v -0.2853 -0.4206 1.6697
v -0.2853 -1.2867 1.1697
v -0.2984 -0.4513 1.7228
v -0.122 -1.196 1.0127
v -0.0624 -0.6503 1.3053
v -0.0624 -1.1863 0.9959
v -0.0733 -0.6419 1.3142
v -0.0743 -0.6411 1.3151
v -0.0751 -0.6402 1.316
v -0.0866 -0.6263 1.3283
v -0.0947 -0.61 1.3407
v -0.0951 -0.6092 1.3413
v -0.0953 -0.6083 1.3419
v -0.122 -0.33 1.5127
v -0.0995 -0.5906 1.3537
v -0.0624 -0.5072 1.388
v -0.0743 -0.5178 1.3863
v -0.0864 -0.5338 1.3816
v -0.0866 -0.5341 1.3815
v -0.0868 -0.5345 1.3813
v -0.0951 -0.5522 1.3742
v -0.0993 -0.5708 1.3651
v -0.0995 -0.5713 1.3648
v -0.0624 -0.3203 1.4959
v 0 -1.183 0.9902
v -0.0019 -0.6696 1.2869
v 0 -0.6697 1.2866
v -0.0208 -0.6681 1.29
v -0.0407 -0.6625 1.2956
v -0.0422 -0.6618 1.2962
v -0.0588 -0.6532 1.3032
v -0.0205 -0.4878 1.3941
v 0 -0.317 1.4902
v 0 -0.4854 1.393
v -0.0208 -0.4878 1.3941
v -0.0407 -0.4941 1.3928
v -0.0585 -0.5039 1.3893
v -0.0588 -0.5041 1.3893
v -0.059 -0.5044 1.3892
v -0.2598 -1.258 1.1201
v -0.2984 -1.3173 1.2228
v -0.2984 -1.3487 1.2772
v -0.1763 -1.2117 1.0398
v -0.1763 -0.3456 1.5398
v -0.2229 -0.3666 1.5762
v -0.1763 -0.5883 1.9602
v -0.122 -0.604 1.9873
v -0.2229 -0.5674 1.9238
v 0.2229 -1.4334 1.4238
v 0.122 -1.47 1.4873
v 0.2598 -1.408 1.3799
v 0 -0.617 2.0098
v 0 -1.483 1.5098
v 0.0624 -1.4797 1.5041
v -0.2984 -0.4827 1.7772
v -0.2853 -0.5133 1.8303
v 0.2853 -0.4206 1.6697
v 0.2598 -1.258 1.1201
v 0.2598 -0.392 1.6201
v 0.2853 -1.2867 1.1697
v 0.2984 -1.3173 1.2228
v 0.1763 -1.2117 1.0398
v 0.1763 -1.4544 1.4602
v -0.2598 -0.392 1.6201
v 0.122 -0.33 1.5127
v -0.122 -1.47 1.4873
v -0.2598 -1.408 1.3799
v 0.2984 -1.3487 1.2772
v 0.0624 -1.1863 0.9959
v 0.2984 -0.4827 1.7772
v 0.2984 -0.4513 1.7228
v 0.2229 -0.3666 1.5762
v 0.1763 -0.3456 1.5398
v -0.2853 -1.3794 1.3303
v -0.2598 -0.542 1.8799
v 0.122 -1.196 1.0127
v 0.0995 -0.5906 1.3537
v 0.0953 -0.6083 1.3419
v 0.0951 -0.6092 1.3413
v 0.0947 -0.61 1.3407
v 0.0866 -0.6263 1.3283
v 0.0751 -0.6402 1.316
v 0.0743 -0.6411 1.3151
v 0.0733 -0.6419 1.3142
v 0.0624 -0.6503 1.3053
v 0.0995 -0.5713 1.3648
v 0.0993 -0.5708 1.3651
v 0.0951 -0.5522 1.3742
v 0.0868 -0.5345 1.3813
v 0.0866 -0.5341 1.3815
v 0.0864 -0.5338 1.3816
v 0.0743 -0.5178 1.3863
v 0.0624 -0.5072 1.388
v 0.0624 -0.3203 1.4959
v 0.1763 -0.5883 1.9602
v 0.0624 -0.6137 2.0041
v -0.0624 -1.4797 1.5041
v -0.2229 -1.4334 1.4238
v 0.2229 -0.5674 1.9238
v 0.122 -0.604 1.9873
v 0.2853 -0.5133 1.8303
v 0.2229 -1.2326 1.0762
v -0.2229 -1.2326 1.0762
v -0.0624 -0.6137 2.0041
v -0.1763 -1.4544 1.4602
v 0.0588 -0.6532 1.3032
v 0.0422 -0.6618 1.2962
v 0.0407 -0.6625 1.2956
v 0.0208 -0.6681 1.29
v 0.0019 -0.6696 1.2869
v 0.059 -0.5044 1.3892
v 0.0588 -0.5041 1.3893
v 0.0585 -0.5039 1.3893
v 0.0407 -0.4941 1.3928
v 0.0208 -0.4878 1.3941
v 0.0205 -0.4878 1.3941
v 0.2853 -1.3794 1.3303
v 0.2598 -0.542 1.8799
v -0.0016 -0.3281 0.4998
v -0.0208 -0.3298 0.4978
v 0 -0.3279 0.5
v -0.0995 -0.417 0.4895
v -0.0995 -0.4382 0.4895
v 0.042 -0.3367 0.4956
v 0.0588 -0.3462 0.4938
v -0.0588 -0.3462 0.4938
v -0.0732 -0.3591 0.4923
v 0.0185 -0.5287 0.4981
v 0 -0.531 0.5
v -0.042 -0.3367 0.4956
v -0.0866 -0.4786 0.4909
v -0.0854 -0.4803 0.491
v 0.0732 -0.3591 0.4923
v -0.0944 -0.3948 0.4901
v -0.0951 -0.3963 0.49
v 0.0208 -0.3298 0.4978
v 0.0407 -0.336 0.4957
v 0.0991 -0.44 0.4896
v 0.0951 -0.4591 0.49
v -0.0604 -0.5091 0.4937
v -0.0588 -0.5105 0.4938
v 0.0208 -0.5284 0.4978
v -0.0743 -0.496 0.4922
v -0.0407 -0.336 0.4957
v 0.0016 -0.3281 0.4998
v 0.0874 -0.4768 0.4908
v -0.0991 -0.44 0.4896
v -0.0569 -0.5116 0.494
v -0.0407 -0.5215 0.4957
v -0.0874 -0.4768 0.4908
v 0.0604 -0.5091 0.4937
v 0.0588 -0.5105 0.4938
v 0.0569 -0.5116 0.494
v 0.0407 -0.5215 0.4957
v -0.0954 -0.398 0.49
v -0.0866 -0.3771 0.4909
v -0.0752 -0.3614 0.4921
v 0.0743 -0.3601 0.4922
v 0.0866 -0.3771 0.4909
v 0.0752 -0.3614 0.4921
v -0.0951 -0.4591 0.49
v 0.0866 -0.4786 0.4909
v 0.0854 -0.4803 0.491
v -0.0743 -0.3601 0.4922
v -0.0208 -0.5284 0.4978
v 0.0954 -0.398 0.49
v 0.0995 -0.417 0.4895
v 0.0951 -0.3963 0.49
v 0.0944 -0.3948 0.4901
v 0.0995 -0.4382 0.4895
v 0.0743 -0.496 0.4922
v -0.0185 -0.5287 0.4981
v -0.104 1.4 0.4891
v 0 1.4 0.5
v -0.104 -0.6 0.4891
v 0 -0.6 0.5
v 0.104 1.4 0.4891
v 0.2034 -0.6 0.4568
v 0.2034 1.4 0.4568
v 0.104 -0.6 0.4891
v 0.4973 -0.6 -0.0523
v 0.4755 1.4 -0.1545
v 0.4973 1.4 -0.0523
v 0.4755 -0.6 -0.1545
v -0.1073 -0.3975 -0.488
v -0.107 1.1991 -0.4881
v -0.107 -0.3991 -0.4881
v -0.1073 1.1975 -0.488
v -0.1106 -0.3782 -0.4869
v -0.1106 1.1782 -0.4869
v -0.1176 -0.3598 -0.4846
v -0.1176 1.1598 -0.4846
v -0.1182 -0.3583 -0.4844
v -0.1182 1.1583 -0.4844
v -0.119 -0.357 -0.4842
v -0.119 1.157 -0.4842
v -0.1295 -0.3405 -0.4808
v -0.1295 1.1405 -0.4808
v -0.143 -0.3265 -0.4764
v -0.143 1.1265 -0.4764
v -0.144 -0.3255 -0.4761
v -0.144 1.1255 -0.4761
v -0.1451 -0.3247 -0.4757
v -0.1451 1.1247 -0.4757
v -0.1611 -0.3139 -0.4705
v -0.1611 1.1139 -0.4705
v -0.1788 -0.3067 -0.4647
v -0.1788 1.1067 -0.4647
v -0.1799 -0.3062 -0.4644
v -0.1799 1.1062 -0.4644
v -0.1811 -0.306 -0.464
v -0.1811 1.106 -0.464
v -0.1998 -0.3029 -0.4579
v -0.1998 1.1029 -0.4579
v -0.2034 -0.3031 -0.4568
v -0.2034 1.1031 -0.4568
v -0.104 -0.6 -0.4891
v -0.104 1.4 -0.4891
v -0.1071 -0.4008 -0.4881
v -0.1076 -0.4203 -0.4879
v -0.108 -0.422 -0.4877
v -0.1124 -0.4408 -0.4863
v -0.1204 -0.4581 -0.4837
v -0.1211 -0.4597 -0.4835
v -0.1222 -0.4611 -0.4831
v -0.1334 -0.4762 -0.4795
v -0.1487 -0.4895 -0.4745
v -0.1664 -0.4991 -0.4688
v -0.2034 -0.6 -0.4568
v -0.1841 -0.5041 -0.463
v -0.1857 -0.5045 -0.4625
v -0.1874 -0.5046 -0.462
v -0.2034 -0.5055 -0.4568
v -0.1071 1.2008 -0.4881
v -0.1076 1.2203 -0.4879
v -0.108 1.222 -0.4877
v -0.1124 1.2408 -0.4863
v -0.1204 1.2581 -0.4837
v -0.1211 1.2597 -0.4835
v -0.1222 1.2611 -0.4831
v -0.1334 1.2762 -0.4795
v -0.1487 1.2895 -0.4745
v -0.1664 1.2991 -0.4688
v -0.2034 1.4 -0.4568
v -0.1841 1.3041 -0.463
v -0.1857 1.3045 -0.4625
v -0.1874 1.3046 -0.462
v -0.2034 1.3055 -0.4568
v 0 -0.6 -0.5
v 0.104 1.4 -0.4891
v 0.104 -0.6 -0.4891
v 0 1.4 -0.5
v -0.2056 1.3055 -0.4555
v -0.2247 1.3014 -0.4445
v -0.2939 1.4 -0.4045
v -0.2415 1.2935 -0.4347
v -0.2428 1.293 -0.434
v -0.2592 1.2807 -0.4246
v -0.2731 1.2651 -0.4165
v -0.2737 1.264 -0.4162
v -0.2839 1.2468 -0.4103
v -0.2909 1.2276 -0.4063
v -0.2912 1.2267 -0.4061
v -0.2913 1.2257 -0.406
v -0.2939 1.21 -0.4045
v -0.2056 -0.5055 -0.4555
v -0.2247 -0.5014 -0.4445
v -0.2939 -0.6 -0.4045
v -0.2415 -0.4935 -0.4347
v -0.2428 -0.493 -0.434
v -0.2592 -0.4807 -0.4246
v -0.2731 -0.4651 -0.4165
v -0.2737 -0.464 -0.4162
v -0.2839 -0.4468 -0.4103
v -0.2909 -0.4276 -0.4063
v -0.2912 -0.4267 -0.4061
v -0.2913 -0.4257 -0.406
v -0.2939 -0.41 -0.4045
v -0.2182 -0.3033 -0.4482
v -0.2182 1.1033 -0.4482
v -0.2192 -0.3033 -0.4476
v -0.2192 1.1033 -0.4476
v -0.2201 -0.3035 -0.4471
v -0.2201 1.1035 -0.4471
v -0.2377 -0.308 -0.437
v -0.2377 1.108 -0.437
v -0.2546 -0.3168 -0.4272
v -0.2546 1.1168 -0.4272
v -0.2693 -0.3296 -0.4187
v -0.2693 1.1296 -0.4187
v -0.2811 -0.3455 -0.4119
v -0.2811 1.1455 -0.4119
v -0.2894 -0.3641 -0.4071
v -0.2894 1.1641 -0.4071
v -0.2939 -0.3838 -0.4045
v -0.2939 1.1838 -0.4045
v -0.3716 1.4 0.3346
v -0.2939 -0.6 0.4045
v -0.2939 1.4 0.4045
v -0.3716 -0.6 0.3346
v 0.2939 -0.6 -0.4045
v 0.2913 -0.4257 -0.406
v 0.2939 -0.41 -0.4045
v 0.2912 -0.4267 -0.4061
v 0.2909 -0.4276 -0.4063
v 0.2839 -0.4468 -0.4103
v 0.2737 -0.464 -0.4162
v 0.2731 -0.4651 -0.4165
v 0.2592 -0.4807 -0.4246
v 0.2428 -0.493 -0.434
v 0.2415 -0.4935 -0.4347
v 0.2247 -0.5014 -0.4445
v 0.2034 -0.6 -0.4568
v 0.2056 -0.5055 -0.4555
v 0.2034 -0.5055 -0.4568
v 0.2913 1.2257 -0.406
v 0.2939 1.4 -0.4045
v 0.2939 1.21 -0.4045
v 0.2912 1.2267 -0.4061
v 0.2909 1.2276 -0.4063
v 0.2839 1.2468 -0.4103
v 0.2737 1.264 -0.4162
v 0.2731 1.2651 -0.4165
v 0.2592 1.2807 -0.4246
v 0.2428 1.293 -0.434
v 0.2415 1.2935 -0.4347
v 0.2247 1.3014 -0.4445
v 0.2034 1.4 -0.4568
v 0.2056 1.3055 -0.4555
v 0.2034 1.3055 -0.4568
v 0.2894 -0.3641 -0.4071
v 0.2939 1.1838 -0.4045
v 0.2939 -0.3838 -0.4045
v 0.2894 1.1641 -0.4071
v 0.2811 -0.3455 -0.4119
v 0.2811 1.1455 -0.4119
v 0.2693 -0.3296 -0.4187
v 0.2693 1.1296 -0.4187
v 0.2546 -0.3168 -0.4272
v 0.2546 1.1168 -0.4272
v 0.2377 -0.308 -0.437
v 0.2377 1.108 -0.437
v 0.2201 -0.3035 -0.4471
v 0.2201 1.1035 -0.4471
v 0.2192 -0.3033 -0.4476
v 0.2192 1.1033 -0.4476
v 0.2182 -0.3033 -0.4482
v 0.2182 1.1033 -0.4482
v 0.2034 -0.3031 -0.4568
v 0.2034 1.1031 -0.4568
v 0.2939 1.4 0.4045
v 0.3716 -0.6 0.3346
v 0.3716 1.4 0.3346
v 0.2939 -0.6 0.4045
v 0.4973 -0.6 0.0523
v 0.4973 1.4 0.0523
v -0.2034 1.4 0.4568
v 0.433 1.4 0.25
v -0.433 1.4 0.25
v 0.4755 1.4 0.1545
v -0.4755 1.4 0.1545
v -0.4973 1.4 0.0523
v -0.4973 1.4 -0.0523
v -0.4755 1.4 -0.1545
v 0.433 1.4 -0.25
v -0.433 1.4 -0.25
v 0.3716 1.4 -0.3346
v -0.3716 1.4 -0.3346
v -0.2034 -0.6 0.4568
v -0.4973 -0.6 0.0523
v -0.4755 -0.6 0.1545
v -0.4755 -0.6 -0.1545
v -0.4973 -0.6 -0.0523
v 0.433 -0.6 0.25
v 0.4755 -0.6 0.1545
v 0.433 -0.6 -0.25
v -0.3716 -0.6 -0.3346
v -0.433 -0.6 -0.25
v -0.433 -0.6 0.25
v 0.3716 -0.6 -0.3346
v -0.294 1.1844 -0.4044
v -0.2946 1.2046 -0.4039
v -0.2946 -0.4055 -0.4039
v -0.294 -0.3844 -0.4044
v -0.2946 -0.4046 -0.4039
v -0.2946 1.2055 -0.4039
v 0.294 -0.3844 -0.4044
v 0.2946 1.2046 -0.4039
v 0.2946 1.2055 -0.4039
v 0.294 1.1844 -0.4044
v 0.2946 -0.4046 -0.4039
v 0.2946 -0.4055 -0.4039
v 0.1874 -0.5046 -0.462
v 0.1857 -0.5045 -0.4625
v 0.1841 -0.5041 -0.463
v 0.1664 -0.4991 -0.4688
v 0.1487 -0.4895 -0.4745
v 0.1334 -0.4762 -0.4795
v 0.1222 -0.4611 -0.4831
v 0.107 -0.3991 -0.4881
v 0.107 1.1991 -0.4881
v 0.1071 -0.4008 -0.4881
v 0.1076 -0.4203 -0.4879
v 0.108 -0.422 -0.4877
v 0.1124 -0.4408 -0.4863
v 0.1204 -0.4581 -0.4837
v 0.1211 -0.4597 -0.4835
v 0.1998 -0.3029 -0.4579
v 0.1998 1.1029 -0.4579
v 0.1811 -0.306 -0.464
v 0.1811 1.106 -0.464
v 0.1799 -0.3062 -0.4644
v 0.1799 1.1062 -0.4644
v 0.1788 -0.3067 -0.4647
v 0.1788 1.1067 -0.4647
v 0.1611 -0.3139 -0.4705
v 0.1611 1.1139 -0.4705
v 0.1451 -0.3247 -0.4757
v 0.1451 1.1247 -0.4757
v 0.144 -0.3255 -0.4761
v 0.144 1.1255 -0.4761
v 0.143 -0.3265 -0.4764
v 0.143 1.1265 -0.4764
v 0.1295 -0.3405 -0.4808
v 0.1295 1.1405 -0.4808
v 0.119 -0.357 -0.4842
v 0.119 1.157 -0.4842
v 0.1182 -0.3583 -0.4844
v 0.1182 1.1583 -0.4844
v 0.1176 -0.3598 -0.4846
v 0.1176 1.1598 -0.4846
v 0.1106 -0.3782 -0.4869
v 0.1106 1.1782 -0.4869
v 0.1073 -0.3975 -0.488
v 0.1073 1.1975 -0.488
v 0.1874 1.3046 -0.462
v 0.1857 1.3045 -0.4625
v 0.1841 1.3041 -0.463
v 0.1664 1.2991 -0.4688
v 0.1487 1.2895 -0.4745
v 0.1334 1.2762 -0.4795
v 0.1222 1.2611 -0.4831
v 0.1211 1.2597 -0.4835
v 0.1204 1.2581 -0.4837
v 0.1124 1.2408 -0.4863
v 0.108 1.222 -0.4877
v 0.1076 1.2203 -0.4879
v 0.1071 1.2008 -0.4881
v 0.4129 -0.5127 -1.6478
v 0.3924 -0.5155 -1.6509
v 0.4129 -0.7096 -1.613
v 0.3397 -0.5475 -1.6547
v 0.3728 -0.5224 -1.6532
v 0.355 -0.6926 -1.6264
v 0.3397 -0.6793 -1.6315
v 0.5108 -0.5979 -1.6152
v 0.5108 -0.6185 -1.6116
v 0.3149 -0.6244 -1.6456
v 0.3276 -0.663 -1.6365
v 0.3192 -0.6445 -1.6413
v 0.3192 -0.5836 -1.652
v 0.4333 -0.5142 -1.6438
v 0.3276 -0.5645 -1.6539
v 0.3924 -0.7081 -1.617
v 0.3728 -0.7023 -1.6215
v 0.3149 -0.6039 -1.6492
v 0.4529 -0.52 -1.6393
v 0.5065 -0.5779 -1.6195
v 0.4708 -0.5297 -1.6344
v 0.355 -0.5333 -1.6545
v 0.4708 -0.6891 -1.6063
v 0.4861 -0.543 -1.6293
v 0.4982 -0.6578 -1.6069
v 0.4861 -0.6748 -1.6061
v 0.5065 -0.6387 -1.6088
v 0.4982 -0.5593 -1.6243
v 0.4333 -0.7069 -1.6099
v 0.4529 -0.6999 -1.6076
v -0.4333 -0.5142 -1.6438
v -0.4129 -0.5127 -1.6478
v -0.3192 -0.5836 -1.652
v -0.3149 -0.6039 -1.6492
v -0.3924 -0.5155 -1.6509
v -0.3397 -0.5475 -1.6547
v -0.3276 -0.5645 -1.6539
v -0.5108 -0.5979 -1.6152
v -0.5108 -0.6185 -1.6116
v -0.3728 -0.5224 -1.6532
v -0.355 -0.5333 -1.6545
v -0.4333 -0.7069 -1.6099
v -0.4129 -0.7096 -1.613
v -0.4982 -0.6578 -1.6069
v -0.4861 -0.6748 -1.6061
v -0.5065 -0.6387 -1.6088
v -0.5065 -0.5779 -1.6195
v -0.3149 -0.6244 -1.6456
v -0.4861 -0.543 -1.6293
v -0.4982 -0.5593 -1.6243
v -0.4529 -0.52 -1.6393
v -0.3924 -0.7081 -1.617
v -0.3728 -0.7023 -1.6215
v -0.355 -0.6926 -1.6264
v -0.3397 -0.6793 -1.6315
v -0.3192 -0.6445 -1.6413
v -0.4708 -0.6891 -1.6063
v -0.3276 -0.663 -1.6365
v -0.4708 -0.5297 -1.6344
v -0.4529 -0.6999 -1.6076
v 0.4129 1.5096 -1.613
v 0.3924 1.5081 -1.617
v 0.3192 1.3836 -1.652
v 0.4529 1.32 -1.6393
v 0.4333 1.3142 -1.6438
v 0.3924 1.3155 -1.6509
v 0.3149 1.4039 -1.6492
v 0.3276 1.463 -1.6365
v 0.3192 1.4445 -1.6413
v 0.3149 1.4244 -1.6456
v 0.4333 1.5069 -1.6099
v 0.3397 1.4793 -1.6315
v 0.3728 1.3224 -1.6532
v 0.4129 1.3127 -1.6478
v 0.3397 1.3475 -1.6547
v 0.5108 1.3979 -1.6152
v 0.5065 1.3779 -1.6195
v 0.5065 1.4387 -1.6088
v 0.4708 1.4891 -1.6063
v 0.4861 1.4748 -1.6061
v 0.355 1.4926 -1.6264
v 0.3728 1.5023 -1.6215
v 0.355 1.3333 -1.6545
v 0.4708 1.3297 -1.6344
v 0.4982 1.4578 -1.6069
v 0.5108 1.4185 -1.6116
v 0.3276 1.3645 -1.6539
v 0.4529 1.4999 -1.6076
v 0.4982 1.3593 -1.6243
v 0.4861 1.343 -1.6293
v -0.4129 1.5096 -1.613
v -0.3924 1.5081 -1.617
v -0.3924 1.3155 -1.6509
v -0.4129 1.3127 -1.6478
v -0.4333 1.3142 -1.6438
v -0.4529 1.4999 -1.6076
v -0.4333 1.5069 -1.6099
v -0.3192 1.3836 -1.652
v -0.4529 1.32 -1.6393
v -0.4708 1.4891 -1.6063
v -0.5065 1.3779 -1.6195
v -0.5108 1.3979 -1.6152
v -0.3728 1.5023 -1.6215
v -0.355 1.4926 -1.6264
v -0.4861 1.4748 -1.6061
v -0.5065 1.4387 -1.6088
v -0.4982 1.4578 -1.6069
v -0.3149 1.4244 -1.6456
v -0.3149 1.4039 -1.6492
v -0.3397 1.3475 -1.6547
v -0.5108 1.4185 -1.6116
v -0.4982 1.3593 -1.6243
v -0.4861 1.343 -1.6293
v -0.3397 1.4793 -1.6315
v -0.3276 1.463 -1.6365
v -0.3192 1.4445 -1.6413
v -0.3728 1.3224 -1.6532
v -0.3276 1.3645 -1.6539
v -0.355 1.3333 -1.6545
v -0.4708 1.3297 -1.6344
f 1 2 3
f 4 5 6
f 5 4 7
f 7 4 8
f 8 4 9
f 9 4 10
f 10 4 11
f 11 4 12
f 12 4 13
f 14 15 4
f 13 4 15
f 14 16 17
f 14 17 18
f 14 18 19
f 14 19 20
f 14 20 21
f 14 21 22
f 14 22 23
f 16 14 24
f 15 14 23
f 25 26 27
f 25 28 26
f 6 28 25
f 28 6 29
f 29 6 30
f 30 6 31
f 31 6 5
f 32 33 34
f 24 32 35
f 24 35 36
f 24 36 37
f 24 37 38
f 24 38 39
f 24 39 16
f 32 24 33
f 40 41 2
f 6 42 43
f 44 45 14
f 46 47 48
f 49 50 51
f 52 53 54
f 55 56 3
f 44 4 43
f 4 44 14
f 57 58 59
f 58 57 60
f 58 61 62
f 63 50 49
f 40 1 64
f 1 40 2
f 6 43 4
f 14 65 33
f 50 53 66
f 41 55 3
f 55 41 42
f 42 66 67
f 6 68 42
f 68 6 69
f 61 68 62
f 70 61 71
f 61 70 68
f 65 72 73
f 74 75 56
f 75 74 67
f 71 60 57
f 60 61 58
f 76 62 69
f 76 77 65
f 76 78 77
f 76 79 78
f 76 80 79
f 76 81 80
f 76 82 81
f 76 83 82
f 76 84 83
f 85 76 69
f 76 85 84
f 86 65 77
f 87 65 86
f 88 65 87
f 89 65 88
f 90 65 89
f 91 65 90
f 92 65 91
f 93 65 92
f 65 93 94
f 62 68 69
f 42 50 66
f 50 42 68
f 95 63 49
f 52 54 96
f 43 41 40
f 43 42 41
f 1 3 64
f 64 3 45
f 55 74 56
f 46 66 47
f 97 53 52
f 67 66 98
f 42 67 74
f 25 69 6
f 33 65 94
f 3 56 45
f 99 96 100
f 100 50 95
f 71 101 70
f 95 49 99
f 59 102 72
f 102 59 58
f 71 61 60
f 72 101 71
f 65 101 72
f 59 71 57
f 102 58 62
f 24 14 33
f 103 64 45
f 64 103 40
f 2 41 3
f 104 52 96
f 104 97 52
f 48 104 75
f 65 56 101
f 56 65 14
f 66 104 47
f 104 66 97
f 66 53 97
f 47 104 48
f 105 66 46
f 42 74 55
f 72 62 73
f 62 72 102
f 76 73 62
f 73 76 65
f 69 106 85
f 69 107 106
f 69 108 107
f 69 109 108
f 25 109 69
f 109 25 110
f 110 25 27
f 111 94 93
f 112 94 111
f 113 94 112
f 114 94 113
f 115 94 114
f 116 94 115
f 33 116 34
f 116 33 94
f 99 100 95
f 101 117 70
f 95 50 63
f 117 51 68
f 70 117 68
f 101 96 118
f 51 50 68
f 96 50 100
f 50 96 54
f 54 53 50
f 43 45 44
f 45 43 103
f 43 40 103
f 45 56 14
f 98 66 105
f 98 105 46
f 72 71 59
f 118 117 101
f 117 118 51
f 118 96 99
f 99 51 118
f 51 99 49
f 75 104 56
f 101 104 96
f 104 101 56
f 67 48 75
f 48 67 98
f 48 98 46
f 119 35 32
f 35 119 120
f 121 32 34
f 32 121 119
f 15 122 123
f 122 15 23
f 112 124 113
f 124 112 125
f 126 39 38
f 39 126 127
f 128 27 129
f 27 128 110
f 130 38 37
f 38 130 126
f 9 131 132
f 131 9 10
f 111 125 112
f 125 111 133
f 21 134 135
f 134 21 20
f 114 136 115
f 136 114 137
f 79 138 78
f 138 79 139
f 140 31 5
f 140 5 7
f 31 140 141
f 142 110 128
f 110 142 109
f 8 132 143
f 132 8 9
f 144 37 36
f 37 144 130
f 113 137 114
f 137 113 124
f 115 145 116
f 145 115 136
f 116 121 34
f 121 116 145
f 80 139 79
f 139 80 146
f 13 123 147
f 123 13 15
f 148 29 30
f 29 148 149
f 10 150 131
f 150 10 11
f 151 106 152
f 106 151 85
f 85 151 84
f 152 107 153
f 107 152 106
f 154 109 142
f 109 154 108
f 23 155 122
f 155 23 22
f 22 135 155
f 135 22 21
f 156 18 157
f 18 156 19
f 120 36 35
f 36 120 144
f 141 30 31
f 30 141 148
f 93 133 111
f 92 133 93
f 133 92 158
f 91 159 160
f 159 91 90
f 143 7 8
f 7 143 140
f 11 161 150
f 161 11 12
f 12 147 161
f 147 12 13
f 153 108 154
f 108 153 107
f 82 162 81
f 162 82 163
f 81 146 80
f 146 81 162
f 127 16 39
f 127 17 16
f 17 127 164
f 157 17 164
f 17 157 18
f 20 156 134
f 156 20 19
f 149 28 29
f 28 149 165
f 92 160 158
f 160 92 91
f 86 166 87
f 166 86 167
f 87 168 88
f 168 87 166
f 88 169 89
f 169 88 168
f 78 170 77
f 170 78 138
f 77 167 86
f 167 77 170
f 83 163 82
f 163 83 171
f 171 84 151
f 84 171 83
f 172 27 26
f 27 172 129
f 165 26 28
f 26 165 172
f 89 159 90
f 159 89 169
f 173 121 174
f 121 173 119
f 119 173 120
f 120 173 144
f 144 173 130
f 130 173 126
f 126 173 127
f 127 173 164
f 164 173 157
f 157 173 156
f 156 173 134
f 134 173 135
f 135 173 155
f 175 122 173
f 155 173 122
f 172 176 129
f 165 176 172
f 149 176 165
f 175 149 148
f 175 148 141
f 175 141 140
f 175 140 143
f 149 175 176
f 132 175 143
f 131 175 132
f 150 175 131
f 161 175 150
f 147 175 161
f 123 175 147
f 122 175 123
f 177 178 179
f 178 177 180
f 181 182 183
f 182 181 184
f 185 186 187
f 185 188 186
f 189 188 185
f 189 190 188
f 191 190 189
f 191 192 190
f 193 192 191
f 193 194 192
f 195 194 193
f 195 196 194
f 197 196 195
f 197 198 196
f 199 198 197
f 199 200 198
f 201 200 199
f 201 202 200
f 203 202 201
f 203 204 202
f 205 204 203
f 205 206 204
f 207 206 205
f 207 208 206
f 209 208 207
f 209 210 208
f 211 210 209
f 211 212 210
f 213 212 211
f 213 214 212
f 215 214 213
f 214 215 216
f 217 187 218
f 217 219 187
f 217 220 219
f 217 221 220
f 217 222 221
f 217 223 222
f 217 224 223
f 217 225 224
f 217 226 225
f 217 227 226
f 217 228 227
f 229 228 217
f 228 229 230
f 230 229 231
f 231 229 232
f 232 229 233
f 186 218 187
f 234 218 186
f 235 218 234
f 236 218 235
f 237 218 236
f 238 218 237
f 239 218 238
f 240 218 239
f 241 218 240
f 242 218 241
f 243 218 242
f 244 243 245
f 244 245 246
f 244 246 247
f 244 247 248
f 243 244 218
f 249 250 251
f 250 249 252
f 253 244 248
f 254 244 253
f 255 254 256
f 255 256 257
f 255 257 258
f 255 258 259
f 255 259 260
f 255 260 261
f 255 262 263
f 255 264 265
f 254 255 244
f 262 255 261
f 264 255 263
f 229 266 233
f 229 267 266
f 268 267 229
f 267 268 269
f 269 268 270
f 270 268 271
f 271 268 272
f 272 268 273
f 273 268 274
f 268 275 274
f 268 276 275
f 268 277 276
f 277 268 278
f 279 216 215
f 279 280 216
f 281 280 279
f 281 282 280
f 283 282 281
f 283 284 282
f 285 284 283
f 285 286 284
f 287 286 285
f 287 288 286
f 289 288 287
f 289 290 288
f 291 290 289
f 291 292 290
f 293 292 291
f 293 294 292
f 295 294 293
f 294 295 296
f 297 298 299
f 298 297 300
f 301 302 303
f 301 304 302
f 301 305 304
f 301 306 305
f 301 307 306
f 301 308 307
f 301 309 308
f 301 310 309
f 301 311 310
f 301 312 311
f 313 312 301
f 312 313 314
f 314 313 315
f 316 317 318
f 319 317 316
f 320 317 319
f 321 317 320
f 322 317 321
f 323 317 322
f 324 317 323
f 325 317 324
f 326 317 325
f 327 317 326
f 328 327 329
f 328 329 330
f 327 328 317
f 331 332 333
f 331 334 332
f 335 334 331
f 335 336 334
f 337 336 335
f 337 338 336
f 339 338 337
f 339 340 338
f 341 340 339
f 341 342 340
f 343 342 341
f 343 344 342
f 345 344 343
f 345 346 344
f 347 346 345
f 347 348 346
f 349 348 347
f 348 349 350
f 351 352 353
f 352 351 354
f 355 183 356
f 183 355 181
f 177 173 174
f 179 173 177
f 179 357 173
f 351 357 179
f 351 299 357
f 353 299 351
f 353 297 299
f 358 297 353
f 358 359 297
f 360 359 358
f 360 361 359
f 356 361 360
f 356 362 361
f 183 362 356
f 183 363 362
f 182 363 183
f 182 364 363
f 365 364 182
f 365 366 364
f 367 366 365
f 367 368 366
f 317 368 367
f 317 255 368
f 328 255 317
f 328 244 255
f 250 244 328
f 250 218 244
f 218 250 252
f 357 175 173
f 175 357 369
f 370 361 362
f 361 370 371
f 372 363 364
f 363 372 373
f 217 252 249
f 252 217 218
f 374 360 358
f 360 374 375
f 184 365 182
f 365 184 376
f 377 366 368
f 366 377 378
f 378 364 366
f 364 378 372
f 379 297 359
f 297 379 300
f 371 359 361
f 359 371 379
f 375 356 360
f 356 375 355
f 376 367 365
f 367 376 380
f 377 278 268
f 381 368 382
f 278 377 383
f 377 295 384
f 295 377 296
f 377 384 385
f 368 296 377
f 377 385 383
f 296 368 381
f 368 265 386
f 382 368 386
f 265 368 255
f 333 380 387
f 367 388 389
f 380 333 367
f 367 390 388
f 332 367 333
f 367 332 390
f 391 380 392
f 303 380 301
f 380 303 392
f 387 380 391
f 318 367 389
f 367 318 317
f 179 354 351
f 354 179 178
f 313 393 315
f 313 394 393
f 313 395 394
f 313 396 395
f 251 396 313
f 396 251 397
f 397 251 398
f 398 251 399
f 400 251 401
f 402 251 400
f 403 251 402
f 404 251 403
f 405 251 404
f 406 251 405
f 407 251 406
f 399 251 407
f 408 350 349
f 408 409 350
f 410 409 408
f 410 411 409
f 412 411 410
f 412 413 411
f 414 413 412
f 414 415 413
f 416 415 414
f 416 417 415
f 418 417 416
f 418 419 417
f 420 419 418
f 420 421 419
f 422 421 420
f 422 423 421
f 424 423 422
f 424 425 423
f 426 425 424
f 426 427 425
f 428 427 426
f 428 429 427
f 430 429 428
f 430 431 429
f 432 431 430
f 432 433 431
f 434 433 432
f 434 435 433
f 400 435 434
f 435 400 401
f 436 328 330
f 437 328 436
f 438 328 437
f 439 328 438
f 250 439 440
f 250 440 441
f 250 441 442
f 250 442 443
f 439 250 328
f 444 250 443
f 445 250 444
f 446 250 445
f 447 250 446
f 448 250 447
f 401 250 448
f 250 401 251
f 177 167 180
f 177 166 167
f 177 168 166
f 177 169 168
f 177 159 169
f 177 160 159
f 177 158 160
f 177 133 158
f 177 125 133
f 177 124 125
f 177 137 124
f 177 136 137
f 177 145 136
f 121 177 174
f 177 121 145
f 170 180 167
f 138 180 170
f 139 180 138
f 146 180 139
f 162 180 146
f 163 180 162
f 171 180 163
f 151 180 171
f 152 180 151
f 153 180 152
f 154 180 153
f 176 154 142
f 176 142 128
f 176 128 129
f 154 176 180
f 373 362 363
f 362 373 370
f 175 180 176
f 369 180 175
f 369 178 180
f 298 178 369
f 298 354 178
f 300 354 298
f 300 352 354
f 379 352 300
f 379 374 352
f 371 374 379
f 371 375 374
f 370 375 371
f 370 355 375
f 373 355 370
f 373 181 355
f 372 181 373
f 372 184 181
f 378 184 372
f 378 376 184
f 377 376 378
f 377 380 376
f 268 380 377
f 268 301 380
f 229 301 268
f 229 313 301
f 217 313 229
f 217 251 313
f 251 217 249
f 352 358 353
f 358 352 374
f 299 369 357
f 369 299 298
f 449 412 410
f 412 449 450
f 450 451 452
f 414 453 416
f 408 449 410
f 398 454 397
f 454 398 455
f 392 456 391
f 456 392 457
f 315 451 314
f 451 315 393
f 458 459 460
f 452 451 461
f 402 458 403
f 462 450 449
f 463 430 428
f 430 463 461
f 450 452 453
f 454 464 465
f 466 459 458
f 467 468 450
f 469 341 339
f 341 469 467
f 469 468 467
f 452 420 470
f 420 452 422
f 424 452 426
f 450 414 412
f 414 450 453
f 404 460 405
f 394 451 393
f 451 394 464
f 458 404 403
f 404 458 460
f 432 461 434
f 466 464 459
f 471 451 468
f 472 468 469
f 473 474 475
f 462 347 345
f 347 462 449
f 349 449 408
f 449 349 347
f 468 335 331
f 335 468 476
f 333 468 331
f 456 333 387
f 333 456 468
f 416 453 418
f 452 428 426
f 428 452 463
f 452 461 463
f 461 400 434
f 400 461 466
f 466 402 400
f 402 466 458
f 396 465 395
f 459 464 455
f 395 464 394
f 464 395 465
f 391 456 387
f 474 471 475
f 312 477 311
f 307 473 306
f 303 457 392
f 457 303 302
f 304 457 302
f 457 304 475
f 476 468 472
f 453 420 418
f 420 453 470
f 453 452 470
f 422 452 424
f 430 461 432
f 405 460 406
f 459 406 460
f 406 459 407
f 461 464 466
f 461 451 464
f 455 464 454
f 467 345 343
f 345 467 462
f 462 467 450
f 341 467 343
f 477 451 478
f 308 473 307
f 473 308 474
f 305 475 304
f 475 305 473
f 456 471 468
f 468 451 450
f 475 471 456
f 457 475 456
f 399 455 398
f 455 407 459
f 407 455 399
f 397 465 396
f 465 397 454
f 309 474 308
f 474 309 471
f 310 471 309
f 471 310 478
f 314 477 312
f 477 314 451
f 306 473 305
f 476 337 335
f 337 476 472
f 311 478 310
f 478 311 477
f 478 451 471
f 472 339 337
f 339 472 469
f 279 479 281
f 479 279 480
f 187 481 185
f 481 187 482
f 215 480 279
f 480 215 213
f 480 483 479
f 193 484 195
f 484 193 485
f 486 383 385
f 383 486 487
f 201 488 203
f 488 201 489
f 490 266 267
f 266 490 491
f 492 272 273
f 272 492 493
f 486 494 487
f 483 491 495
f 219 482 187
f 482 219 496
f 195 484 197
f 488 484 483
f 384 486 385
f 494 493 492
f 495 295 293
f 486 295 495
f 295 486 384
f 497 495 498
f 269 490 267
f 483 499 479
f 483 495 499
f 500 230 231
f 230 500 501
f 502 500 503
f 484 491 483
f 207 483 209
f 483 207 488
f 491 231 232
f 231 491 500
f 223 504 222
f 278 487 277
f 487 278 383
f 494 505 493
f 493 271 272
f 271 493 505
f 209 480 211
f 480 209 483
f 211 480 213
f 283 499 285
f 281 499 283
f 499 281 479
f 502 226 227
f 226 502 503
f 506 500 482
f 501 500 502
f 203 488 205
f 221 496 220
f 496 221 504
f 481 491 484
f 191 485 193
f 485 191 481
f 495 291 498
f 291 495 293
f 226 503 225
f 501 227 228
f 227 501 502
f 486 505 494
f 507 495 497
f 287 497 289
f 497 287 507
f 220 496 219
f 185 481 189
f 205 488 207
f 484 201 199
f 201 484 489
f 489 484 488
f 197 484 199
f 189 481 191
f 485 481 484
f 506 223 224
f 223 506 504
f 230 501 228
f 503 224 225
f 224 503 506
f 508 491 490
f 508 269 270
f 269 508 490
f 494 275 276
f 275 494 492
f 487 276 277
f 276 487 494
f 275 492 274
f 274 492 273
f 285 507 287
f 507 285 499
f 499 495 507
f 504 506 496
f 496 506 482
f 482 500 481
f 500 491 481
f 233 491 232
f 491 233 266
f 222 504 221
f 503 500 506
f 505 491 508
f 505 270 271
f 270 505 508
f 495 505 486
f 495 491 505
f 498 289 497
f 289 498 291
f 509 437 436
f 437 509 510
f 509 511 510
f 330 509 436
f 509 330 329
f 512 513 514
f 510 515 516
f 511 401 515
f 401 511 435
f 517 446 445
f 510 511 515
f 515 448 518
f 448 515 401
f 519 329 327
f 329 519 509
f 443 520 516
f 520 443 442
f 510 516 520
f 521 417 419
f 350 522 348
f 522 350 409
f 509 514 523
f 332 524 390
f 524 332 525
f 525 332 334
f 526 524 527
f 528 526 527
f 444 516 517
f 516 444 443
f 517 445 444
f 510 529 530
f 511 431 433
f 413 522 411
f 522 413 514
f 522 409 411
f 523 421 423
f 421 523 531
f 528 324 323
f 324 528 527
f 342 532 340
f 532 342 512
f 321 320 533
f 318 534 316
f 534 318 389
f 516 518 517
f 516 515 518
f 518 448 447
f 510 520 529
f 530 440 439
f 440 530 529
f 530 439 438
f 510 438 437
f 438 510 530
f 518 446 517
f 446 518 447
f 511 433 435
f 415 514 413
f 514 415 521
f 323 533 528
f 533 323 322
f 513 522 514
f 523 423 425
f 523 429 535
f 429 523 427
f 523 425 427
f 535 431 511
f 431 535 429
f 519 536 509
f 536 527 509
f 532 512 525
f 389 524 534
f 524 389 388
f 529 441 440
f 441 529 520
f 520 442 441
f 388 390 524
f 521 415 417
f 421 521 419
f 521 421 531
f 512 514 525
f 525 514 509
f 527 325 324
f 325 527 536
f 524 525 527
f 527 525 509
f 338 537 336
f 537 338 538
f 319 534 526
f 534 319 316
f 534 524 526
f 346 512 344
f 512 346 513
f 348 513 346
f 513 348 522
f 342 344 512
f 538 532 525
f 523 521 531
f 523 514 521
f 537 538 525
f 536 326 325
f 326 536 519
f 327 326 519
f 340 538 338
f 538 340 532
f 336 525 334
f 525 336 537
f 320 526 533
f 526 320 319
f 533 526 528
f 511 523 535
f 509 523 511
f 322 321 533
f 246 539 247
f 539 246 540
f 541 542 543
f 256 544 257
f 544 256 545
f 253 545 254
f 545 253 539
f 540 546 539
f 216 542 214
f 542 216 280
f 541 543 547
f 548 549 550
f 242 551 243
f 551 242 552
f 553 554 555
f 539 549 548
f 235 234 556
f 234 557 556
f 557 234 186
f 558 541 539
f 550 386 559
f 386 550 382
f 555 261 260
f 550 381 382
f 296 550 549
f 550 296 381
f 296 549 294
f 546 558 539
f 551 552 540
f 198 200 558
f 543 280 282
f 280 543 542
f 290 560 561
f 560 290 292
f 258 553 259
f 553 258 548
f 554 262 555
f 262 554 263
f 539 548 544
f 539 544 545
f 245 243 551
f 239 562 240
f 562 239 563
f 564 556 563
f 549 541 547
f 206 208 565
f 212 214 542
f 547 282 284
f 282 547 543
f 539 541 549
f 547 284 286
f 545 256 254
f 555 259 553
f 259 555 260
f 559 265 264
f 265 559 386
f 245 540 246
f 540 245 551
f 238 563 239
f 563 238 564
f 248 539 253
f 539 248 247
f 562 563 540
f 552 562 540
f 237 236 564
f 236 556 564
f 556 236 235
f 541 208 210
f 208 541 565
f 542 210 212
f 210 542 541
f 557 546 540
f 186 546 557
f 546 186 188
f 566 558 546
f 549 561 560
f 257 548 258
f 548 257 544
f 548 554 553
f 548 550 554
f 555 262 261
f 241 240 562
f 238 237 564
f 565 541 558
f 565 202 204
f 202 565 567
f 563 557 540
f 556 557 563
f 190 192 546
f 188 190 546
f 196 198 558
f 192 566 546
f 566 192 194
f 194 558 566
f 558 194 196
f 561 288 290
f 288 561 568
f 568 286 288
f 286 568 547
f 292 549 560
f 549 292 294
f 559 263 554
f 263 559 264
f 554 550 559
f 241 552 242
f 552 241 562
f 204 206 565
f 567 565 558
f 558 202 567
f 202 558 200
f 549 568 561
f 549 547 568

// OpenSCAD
translate([0,0.4,0]) rotate([0,0,90]) union() {
    translate([-0.9,0,0.9]) {
        translate([-0.4,0,0.6]) rotate([0,60,0])
            cylinder(h=1,r=0.3,center=true,$fn=30);
        rotate([0,-10,0])
            cylinder(h=1,r=0.1,center=true,$fn=30);
    }
    rotate([0,90,0])
        cylinder(h=2,r=0.5,center=true,$fn=30);
    translate([-0.9,-0.3,-1])
        rotate([-10,10,0])
            cylinder(h=1.3,r=0.1,center=true,$fn=30);
    translate([-0.9,0.3,-1])
        rotate([10,10,0])
            cylinder(h=1.3,r=0.1,center=true,$fn=30);
    translate([0.9,-0.3,-1])
        rotate([-10,-10,0])
            cylinder(h=1.3,r=0.1,center=true,$fn=30);
    translate([0.9,0.3,-1])
        rotate([10,-10,0])
            cylinder(h=1.3,r=0.1,center=true,$fn=30);
}
